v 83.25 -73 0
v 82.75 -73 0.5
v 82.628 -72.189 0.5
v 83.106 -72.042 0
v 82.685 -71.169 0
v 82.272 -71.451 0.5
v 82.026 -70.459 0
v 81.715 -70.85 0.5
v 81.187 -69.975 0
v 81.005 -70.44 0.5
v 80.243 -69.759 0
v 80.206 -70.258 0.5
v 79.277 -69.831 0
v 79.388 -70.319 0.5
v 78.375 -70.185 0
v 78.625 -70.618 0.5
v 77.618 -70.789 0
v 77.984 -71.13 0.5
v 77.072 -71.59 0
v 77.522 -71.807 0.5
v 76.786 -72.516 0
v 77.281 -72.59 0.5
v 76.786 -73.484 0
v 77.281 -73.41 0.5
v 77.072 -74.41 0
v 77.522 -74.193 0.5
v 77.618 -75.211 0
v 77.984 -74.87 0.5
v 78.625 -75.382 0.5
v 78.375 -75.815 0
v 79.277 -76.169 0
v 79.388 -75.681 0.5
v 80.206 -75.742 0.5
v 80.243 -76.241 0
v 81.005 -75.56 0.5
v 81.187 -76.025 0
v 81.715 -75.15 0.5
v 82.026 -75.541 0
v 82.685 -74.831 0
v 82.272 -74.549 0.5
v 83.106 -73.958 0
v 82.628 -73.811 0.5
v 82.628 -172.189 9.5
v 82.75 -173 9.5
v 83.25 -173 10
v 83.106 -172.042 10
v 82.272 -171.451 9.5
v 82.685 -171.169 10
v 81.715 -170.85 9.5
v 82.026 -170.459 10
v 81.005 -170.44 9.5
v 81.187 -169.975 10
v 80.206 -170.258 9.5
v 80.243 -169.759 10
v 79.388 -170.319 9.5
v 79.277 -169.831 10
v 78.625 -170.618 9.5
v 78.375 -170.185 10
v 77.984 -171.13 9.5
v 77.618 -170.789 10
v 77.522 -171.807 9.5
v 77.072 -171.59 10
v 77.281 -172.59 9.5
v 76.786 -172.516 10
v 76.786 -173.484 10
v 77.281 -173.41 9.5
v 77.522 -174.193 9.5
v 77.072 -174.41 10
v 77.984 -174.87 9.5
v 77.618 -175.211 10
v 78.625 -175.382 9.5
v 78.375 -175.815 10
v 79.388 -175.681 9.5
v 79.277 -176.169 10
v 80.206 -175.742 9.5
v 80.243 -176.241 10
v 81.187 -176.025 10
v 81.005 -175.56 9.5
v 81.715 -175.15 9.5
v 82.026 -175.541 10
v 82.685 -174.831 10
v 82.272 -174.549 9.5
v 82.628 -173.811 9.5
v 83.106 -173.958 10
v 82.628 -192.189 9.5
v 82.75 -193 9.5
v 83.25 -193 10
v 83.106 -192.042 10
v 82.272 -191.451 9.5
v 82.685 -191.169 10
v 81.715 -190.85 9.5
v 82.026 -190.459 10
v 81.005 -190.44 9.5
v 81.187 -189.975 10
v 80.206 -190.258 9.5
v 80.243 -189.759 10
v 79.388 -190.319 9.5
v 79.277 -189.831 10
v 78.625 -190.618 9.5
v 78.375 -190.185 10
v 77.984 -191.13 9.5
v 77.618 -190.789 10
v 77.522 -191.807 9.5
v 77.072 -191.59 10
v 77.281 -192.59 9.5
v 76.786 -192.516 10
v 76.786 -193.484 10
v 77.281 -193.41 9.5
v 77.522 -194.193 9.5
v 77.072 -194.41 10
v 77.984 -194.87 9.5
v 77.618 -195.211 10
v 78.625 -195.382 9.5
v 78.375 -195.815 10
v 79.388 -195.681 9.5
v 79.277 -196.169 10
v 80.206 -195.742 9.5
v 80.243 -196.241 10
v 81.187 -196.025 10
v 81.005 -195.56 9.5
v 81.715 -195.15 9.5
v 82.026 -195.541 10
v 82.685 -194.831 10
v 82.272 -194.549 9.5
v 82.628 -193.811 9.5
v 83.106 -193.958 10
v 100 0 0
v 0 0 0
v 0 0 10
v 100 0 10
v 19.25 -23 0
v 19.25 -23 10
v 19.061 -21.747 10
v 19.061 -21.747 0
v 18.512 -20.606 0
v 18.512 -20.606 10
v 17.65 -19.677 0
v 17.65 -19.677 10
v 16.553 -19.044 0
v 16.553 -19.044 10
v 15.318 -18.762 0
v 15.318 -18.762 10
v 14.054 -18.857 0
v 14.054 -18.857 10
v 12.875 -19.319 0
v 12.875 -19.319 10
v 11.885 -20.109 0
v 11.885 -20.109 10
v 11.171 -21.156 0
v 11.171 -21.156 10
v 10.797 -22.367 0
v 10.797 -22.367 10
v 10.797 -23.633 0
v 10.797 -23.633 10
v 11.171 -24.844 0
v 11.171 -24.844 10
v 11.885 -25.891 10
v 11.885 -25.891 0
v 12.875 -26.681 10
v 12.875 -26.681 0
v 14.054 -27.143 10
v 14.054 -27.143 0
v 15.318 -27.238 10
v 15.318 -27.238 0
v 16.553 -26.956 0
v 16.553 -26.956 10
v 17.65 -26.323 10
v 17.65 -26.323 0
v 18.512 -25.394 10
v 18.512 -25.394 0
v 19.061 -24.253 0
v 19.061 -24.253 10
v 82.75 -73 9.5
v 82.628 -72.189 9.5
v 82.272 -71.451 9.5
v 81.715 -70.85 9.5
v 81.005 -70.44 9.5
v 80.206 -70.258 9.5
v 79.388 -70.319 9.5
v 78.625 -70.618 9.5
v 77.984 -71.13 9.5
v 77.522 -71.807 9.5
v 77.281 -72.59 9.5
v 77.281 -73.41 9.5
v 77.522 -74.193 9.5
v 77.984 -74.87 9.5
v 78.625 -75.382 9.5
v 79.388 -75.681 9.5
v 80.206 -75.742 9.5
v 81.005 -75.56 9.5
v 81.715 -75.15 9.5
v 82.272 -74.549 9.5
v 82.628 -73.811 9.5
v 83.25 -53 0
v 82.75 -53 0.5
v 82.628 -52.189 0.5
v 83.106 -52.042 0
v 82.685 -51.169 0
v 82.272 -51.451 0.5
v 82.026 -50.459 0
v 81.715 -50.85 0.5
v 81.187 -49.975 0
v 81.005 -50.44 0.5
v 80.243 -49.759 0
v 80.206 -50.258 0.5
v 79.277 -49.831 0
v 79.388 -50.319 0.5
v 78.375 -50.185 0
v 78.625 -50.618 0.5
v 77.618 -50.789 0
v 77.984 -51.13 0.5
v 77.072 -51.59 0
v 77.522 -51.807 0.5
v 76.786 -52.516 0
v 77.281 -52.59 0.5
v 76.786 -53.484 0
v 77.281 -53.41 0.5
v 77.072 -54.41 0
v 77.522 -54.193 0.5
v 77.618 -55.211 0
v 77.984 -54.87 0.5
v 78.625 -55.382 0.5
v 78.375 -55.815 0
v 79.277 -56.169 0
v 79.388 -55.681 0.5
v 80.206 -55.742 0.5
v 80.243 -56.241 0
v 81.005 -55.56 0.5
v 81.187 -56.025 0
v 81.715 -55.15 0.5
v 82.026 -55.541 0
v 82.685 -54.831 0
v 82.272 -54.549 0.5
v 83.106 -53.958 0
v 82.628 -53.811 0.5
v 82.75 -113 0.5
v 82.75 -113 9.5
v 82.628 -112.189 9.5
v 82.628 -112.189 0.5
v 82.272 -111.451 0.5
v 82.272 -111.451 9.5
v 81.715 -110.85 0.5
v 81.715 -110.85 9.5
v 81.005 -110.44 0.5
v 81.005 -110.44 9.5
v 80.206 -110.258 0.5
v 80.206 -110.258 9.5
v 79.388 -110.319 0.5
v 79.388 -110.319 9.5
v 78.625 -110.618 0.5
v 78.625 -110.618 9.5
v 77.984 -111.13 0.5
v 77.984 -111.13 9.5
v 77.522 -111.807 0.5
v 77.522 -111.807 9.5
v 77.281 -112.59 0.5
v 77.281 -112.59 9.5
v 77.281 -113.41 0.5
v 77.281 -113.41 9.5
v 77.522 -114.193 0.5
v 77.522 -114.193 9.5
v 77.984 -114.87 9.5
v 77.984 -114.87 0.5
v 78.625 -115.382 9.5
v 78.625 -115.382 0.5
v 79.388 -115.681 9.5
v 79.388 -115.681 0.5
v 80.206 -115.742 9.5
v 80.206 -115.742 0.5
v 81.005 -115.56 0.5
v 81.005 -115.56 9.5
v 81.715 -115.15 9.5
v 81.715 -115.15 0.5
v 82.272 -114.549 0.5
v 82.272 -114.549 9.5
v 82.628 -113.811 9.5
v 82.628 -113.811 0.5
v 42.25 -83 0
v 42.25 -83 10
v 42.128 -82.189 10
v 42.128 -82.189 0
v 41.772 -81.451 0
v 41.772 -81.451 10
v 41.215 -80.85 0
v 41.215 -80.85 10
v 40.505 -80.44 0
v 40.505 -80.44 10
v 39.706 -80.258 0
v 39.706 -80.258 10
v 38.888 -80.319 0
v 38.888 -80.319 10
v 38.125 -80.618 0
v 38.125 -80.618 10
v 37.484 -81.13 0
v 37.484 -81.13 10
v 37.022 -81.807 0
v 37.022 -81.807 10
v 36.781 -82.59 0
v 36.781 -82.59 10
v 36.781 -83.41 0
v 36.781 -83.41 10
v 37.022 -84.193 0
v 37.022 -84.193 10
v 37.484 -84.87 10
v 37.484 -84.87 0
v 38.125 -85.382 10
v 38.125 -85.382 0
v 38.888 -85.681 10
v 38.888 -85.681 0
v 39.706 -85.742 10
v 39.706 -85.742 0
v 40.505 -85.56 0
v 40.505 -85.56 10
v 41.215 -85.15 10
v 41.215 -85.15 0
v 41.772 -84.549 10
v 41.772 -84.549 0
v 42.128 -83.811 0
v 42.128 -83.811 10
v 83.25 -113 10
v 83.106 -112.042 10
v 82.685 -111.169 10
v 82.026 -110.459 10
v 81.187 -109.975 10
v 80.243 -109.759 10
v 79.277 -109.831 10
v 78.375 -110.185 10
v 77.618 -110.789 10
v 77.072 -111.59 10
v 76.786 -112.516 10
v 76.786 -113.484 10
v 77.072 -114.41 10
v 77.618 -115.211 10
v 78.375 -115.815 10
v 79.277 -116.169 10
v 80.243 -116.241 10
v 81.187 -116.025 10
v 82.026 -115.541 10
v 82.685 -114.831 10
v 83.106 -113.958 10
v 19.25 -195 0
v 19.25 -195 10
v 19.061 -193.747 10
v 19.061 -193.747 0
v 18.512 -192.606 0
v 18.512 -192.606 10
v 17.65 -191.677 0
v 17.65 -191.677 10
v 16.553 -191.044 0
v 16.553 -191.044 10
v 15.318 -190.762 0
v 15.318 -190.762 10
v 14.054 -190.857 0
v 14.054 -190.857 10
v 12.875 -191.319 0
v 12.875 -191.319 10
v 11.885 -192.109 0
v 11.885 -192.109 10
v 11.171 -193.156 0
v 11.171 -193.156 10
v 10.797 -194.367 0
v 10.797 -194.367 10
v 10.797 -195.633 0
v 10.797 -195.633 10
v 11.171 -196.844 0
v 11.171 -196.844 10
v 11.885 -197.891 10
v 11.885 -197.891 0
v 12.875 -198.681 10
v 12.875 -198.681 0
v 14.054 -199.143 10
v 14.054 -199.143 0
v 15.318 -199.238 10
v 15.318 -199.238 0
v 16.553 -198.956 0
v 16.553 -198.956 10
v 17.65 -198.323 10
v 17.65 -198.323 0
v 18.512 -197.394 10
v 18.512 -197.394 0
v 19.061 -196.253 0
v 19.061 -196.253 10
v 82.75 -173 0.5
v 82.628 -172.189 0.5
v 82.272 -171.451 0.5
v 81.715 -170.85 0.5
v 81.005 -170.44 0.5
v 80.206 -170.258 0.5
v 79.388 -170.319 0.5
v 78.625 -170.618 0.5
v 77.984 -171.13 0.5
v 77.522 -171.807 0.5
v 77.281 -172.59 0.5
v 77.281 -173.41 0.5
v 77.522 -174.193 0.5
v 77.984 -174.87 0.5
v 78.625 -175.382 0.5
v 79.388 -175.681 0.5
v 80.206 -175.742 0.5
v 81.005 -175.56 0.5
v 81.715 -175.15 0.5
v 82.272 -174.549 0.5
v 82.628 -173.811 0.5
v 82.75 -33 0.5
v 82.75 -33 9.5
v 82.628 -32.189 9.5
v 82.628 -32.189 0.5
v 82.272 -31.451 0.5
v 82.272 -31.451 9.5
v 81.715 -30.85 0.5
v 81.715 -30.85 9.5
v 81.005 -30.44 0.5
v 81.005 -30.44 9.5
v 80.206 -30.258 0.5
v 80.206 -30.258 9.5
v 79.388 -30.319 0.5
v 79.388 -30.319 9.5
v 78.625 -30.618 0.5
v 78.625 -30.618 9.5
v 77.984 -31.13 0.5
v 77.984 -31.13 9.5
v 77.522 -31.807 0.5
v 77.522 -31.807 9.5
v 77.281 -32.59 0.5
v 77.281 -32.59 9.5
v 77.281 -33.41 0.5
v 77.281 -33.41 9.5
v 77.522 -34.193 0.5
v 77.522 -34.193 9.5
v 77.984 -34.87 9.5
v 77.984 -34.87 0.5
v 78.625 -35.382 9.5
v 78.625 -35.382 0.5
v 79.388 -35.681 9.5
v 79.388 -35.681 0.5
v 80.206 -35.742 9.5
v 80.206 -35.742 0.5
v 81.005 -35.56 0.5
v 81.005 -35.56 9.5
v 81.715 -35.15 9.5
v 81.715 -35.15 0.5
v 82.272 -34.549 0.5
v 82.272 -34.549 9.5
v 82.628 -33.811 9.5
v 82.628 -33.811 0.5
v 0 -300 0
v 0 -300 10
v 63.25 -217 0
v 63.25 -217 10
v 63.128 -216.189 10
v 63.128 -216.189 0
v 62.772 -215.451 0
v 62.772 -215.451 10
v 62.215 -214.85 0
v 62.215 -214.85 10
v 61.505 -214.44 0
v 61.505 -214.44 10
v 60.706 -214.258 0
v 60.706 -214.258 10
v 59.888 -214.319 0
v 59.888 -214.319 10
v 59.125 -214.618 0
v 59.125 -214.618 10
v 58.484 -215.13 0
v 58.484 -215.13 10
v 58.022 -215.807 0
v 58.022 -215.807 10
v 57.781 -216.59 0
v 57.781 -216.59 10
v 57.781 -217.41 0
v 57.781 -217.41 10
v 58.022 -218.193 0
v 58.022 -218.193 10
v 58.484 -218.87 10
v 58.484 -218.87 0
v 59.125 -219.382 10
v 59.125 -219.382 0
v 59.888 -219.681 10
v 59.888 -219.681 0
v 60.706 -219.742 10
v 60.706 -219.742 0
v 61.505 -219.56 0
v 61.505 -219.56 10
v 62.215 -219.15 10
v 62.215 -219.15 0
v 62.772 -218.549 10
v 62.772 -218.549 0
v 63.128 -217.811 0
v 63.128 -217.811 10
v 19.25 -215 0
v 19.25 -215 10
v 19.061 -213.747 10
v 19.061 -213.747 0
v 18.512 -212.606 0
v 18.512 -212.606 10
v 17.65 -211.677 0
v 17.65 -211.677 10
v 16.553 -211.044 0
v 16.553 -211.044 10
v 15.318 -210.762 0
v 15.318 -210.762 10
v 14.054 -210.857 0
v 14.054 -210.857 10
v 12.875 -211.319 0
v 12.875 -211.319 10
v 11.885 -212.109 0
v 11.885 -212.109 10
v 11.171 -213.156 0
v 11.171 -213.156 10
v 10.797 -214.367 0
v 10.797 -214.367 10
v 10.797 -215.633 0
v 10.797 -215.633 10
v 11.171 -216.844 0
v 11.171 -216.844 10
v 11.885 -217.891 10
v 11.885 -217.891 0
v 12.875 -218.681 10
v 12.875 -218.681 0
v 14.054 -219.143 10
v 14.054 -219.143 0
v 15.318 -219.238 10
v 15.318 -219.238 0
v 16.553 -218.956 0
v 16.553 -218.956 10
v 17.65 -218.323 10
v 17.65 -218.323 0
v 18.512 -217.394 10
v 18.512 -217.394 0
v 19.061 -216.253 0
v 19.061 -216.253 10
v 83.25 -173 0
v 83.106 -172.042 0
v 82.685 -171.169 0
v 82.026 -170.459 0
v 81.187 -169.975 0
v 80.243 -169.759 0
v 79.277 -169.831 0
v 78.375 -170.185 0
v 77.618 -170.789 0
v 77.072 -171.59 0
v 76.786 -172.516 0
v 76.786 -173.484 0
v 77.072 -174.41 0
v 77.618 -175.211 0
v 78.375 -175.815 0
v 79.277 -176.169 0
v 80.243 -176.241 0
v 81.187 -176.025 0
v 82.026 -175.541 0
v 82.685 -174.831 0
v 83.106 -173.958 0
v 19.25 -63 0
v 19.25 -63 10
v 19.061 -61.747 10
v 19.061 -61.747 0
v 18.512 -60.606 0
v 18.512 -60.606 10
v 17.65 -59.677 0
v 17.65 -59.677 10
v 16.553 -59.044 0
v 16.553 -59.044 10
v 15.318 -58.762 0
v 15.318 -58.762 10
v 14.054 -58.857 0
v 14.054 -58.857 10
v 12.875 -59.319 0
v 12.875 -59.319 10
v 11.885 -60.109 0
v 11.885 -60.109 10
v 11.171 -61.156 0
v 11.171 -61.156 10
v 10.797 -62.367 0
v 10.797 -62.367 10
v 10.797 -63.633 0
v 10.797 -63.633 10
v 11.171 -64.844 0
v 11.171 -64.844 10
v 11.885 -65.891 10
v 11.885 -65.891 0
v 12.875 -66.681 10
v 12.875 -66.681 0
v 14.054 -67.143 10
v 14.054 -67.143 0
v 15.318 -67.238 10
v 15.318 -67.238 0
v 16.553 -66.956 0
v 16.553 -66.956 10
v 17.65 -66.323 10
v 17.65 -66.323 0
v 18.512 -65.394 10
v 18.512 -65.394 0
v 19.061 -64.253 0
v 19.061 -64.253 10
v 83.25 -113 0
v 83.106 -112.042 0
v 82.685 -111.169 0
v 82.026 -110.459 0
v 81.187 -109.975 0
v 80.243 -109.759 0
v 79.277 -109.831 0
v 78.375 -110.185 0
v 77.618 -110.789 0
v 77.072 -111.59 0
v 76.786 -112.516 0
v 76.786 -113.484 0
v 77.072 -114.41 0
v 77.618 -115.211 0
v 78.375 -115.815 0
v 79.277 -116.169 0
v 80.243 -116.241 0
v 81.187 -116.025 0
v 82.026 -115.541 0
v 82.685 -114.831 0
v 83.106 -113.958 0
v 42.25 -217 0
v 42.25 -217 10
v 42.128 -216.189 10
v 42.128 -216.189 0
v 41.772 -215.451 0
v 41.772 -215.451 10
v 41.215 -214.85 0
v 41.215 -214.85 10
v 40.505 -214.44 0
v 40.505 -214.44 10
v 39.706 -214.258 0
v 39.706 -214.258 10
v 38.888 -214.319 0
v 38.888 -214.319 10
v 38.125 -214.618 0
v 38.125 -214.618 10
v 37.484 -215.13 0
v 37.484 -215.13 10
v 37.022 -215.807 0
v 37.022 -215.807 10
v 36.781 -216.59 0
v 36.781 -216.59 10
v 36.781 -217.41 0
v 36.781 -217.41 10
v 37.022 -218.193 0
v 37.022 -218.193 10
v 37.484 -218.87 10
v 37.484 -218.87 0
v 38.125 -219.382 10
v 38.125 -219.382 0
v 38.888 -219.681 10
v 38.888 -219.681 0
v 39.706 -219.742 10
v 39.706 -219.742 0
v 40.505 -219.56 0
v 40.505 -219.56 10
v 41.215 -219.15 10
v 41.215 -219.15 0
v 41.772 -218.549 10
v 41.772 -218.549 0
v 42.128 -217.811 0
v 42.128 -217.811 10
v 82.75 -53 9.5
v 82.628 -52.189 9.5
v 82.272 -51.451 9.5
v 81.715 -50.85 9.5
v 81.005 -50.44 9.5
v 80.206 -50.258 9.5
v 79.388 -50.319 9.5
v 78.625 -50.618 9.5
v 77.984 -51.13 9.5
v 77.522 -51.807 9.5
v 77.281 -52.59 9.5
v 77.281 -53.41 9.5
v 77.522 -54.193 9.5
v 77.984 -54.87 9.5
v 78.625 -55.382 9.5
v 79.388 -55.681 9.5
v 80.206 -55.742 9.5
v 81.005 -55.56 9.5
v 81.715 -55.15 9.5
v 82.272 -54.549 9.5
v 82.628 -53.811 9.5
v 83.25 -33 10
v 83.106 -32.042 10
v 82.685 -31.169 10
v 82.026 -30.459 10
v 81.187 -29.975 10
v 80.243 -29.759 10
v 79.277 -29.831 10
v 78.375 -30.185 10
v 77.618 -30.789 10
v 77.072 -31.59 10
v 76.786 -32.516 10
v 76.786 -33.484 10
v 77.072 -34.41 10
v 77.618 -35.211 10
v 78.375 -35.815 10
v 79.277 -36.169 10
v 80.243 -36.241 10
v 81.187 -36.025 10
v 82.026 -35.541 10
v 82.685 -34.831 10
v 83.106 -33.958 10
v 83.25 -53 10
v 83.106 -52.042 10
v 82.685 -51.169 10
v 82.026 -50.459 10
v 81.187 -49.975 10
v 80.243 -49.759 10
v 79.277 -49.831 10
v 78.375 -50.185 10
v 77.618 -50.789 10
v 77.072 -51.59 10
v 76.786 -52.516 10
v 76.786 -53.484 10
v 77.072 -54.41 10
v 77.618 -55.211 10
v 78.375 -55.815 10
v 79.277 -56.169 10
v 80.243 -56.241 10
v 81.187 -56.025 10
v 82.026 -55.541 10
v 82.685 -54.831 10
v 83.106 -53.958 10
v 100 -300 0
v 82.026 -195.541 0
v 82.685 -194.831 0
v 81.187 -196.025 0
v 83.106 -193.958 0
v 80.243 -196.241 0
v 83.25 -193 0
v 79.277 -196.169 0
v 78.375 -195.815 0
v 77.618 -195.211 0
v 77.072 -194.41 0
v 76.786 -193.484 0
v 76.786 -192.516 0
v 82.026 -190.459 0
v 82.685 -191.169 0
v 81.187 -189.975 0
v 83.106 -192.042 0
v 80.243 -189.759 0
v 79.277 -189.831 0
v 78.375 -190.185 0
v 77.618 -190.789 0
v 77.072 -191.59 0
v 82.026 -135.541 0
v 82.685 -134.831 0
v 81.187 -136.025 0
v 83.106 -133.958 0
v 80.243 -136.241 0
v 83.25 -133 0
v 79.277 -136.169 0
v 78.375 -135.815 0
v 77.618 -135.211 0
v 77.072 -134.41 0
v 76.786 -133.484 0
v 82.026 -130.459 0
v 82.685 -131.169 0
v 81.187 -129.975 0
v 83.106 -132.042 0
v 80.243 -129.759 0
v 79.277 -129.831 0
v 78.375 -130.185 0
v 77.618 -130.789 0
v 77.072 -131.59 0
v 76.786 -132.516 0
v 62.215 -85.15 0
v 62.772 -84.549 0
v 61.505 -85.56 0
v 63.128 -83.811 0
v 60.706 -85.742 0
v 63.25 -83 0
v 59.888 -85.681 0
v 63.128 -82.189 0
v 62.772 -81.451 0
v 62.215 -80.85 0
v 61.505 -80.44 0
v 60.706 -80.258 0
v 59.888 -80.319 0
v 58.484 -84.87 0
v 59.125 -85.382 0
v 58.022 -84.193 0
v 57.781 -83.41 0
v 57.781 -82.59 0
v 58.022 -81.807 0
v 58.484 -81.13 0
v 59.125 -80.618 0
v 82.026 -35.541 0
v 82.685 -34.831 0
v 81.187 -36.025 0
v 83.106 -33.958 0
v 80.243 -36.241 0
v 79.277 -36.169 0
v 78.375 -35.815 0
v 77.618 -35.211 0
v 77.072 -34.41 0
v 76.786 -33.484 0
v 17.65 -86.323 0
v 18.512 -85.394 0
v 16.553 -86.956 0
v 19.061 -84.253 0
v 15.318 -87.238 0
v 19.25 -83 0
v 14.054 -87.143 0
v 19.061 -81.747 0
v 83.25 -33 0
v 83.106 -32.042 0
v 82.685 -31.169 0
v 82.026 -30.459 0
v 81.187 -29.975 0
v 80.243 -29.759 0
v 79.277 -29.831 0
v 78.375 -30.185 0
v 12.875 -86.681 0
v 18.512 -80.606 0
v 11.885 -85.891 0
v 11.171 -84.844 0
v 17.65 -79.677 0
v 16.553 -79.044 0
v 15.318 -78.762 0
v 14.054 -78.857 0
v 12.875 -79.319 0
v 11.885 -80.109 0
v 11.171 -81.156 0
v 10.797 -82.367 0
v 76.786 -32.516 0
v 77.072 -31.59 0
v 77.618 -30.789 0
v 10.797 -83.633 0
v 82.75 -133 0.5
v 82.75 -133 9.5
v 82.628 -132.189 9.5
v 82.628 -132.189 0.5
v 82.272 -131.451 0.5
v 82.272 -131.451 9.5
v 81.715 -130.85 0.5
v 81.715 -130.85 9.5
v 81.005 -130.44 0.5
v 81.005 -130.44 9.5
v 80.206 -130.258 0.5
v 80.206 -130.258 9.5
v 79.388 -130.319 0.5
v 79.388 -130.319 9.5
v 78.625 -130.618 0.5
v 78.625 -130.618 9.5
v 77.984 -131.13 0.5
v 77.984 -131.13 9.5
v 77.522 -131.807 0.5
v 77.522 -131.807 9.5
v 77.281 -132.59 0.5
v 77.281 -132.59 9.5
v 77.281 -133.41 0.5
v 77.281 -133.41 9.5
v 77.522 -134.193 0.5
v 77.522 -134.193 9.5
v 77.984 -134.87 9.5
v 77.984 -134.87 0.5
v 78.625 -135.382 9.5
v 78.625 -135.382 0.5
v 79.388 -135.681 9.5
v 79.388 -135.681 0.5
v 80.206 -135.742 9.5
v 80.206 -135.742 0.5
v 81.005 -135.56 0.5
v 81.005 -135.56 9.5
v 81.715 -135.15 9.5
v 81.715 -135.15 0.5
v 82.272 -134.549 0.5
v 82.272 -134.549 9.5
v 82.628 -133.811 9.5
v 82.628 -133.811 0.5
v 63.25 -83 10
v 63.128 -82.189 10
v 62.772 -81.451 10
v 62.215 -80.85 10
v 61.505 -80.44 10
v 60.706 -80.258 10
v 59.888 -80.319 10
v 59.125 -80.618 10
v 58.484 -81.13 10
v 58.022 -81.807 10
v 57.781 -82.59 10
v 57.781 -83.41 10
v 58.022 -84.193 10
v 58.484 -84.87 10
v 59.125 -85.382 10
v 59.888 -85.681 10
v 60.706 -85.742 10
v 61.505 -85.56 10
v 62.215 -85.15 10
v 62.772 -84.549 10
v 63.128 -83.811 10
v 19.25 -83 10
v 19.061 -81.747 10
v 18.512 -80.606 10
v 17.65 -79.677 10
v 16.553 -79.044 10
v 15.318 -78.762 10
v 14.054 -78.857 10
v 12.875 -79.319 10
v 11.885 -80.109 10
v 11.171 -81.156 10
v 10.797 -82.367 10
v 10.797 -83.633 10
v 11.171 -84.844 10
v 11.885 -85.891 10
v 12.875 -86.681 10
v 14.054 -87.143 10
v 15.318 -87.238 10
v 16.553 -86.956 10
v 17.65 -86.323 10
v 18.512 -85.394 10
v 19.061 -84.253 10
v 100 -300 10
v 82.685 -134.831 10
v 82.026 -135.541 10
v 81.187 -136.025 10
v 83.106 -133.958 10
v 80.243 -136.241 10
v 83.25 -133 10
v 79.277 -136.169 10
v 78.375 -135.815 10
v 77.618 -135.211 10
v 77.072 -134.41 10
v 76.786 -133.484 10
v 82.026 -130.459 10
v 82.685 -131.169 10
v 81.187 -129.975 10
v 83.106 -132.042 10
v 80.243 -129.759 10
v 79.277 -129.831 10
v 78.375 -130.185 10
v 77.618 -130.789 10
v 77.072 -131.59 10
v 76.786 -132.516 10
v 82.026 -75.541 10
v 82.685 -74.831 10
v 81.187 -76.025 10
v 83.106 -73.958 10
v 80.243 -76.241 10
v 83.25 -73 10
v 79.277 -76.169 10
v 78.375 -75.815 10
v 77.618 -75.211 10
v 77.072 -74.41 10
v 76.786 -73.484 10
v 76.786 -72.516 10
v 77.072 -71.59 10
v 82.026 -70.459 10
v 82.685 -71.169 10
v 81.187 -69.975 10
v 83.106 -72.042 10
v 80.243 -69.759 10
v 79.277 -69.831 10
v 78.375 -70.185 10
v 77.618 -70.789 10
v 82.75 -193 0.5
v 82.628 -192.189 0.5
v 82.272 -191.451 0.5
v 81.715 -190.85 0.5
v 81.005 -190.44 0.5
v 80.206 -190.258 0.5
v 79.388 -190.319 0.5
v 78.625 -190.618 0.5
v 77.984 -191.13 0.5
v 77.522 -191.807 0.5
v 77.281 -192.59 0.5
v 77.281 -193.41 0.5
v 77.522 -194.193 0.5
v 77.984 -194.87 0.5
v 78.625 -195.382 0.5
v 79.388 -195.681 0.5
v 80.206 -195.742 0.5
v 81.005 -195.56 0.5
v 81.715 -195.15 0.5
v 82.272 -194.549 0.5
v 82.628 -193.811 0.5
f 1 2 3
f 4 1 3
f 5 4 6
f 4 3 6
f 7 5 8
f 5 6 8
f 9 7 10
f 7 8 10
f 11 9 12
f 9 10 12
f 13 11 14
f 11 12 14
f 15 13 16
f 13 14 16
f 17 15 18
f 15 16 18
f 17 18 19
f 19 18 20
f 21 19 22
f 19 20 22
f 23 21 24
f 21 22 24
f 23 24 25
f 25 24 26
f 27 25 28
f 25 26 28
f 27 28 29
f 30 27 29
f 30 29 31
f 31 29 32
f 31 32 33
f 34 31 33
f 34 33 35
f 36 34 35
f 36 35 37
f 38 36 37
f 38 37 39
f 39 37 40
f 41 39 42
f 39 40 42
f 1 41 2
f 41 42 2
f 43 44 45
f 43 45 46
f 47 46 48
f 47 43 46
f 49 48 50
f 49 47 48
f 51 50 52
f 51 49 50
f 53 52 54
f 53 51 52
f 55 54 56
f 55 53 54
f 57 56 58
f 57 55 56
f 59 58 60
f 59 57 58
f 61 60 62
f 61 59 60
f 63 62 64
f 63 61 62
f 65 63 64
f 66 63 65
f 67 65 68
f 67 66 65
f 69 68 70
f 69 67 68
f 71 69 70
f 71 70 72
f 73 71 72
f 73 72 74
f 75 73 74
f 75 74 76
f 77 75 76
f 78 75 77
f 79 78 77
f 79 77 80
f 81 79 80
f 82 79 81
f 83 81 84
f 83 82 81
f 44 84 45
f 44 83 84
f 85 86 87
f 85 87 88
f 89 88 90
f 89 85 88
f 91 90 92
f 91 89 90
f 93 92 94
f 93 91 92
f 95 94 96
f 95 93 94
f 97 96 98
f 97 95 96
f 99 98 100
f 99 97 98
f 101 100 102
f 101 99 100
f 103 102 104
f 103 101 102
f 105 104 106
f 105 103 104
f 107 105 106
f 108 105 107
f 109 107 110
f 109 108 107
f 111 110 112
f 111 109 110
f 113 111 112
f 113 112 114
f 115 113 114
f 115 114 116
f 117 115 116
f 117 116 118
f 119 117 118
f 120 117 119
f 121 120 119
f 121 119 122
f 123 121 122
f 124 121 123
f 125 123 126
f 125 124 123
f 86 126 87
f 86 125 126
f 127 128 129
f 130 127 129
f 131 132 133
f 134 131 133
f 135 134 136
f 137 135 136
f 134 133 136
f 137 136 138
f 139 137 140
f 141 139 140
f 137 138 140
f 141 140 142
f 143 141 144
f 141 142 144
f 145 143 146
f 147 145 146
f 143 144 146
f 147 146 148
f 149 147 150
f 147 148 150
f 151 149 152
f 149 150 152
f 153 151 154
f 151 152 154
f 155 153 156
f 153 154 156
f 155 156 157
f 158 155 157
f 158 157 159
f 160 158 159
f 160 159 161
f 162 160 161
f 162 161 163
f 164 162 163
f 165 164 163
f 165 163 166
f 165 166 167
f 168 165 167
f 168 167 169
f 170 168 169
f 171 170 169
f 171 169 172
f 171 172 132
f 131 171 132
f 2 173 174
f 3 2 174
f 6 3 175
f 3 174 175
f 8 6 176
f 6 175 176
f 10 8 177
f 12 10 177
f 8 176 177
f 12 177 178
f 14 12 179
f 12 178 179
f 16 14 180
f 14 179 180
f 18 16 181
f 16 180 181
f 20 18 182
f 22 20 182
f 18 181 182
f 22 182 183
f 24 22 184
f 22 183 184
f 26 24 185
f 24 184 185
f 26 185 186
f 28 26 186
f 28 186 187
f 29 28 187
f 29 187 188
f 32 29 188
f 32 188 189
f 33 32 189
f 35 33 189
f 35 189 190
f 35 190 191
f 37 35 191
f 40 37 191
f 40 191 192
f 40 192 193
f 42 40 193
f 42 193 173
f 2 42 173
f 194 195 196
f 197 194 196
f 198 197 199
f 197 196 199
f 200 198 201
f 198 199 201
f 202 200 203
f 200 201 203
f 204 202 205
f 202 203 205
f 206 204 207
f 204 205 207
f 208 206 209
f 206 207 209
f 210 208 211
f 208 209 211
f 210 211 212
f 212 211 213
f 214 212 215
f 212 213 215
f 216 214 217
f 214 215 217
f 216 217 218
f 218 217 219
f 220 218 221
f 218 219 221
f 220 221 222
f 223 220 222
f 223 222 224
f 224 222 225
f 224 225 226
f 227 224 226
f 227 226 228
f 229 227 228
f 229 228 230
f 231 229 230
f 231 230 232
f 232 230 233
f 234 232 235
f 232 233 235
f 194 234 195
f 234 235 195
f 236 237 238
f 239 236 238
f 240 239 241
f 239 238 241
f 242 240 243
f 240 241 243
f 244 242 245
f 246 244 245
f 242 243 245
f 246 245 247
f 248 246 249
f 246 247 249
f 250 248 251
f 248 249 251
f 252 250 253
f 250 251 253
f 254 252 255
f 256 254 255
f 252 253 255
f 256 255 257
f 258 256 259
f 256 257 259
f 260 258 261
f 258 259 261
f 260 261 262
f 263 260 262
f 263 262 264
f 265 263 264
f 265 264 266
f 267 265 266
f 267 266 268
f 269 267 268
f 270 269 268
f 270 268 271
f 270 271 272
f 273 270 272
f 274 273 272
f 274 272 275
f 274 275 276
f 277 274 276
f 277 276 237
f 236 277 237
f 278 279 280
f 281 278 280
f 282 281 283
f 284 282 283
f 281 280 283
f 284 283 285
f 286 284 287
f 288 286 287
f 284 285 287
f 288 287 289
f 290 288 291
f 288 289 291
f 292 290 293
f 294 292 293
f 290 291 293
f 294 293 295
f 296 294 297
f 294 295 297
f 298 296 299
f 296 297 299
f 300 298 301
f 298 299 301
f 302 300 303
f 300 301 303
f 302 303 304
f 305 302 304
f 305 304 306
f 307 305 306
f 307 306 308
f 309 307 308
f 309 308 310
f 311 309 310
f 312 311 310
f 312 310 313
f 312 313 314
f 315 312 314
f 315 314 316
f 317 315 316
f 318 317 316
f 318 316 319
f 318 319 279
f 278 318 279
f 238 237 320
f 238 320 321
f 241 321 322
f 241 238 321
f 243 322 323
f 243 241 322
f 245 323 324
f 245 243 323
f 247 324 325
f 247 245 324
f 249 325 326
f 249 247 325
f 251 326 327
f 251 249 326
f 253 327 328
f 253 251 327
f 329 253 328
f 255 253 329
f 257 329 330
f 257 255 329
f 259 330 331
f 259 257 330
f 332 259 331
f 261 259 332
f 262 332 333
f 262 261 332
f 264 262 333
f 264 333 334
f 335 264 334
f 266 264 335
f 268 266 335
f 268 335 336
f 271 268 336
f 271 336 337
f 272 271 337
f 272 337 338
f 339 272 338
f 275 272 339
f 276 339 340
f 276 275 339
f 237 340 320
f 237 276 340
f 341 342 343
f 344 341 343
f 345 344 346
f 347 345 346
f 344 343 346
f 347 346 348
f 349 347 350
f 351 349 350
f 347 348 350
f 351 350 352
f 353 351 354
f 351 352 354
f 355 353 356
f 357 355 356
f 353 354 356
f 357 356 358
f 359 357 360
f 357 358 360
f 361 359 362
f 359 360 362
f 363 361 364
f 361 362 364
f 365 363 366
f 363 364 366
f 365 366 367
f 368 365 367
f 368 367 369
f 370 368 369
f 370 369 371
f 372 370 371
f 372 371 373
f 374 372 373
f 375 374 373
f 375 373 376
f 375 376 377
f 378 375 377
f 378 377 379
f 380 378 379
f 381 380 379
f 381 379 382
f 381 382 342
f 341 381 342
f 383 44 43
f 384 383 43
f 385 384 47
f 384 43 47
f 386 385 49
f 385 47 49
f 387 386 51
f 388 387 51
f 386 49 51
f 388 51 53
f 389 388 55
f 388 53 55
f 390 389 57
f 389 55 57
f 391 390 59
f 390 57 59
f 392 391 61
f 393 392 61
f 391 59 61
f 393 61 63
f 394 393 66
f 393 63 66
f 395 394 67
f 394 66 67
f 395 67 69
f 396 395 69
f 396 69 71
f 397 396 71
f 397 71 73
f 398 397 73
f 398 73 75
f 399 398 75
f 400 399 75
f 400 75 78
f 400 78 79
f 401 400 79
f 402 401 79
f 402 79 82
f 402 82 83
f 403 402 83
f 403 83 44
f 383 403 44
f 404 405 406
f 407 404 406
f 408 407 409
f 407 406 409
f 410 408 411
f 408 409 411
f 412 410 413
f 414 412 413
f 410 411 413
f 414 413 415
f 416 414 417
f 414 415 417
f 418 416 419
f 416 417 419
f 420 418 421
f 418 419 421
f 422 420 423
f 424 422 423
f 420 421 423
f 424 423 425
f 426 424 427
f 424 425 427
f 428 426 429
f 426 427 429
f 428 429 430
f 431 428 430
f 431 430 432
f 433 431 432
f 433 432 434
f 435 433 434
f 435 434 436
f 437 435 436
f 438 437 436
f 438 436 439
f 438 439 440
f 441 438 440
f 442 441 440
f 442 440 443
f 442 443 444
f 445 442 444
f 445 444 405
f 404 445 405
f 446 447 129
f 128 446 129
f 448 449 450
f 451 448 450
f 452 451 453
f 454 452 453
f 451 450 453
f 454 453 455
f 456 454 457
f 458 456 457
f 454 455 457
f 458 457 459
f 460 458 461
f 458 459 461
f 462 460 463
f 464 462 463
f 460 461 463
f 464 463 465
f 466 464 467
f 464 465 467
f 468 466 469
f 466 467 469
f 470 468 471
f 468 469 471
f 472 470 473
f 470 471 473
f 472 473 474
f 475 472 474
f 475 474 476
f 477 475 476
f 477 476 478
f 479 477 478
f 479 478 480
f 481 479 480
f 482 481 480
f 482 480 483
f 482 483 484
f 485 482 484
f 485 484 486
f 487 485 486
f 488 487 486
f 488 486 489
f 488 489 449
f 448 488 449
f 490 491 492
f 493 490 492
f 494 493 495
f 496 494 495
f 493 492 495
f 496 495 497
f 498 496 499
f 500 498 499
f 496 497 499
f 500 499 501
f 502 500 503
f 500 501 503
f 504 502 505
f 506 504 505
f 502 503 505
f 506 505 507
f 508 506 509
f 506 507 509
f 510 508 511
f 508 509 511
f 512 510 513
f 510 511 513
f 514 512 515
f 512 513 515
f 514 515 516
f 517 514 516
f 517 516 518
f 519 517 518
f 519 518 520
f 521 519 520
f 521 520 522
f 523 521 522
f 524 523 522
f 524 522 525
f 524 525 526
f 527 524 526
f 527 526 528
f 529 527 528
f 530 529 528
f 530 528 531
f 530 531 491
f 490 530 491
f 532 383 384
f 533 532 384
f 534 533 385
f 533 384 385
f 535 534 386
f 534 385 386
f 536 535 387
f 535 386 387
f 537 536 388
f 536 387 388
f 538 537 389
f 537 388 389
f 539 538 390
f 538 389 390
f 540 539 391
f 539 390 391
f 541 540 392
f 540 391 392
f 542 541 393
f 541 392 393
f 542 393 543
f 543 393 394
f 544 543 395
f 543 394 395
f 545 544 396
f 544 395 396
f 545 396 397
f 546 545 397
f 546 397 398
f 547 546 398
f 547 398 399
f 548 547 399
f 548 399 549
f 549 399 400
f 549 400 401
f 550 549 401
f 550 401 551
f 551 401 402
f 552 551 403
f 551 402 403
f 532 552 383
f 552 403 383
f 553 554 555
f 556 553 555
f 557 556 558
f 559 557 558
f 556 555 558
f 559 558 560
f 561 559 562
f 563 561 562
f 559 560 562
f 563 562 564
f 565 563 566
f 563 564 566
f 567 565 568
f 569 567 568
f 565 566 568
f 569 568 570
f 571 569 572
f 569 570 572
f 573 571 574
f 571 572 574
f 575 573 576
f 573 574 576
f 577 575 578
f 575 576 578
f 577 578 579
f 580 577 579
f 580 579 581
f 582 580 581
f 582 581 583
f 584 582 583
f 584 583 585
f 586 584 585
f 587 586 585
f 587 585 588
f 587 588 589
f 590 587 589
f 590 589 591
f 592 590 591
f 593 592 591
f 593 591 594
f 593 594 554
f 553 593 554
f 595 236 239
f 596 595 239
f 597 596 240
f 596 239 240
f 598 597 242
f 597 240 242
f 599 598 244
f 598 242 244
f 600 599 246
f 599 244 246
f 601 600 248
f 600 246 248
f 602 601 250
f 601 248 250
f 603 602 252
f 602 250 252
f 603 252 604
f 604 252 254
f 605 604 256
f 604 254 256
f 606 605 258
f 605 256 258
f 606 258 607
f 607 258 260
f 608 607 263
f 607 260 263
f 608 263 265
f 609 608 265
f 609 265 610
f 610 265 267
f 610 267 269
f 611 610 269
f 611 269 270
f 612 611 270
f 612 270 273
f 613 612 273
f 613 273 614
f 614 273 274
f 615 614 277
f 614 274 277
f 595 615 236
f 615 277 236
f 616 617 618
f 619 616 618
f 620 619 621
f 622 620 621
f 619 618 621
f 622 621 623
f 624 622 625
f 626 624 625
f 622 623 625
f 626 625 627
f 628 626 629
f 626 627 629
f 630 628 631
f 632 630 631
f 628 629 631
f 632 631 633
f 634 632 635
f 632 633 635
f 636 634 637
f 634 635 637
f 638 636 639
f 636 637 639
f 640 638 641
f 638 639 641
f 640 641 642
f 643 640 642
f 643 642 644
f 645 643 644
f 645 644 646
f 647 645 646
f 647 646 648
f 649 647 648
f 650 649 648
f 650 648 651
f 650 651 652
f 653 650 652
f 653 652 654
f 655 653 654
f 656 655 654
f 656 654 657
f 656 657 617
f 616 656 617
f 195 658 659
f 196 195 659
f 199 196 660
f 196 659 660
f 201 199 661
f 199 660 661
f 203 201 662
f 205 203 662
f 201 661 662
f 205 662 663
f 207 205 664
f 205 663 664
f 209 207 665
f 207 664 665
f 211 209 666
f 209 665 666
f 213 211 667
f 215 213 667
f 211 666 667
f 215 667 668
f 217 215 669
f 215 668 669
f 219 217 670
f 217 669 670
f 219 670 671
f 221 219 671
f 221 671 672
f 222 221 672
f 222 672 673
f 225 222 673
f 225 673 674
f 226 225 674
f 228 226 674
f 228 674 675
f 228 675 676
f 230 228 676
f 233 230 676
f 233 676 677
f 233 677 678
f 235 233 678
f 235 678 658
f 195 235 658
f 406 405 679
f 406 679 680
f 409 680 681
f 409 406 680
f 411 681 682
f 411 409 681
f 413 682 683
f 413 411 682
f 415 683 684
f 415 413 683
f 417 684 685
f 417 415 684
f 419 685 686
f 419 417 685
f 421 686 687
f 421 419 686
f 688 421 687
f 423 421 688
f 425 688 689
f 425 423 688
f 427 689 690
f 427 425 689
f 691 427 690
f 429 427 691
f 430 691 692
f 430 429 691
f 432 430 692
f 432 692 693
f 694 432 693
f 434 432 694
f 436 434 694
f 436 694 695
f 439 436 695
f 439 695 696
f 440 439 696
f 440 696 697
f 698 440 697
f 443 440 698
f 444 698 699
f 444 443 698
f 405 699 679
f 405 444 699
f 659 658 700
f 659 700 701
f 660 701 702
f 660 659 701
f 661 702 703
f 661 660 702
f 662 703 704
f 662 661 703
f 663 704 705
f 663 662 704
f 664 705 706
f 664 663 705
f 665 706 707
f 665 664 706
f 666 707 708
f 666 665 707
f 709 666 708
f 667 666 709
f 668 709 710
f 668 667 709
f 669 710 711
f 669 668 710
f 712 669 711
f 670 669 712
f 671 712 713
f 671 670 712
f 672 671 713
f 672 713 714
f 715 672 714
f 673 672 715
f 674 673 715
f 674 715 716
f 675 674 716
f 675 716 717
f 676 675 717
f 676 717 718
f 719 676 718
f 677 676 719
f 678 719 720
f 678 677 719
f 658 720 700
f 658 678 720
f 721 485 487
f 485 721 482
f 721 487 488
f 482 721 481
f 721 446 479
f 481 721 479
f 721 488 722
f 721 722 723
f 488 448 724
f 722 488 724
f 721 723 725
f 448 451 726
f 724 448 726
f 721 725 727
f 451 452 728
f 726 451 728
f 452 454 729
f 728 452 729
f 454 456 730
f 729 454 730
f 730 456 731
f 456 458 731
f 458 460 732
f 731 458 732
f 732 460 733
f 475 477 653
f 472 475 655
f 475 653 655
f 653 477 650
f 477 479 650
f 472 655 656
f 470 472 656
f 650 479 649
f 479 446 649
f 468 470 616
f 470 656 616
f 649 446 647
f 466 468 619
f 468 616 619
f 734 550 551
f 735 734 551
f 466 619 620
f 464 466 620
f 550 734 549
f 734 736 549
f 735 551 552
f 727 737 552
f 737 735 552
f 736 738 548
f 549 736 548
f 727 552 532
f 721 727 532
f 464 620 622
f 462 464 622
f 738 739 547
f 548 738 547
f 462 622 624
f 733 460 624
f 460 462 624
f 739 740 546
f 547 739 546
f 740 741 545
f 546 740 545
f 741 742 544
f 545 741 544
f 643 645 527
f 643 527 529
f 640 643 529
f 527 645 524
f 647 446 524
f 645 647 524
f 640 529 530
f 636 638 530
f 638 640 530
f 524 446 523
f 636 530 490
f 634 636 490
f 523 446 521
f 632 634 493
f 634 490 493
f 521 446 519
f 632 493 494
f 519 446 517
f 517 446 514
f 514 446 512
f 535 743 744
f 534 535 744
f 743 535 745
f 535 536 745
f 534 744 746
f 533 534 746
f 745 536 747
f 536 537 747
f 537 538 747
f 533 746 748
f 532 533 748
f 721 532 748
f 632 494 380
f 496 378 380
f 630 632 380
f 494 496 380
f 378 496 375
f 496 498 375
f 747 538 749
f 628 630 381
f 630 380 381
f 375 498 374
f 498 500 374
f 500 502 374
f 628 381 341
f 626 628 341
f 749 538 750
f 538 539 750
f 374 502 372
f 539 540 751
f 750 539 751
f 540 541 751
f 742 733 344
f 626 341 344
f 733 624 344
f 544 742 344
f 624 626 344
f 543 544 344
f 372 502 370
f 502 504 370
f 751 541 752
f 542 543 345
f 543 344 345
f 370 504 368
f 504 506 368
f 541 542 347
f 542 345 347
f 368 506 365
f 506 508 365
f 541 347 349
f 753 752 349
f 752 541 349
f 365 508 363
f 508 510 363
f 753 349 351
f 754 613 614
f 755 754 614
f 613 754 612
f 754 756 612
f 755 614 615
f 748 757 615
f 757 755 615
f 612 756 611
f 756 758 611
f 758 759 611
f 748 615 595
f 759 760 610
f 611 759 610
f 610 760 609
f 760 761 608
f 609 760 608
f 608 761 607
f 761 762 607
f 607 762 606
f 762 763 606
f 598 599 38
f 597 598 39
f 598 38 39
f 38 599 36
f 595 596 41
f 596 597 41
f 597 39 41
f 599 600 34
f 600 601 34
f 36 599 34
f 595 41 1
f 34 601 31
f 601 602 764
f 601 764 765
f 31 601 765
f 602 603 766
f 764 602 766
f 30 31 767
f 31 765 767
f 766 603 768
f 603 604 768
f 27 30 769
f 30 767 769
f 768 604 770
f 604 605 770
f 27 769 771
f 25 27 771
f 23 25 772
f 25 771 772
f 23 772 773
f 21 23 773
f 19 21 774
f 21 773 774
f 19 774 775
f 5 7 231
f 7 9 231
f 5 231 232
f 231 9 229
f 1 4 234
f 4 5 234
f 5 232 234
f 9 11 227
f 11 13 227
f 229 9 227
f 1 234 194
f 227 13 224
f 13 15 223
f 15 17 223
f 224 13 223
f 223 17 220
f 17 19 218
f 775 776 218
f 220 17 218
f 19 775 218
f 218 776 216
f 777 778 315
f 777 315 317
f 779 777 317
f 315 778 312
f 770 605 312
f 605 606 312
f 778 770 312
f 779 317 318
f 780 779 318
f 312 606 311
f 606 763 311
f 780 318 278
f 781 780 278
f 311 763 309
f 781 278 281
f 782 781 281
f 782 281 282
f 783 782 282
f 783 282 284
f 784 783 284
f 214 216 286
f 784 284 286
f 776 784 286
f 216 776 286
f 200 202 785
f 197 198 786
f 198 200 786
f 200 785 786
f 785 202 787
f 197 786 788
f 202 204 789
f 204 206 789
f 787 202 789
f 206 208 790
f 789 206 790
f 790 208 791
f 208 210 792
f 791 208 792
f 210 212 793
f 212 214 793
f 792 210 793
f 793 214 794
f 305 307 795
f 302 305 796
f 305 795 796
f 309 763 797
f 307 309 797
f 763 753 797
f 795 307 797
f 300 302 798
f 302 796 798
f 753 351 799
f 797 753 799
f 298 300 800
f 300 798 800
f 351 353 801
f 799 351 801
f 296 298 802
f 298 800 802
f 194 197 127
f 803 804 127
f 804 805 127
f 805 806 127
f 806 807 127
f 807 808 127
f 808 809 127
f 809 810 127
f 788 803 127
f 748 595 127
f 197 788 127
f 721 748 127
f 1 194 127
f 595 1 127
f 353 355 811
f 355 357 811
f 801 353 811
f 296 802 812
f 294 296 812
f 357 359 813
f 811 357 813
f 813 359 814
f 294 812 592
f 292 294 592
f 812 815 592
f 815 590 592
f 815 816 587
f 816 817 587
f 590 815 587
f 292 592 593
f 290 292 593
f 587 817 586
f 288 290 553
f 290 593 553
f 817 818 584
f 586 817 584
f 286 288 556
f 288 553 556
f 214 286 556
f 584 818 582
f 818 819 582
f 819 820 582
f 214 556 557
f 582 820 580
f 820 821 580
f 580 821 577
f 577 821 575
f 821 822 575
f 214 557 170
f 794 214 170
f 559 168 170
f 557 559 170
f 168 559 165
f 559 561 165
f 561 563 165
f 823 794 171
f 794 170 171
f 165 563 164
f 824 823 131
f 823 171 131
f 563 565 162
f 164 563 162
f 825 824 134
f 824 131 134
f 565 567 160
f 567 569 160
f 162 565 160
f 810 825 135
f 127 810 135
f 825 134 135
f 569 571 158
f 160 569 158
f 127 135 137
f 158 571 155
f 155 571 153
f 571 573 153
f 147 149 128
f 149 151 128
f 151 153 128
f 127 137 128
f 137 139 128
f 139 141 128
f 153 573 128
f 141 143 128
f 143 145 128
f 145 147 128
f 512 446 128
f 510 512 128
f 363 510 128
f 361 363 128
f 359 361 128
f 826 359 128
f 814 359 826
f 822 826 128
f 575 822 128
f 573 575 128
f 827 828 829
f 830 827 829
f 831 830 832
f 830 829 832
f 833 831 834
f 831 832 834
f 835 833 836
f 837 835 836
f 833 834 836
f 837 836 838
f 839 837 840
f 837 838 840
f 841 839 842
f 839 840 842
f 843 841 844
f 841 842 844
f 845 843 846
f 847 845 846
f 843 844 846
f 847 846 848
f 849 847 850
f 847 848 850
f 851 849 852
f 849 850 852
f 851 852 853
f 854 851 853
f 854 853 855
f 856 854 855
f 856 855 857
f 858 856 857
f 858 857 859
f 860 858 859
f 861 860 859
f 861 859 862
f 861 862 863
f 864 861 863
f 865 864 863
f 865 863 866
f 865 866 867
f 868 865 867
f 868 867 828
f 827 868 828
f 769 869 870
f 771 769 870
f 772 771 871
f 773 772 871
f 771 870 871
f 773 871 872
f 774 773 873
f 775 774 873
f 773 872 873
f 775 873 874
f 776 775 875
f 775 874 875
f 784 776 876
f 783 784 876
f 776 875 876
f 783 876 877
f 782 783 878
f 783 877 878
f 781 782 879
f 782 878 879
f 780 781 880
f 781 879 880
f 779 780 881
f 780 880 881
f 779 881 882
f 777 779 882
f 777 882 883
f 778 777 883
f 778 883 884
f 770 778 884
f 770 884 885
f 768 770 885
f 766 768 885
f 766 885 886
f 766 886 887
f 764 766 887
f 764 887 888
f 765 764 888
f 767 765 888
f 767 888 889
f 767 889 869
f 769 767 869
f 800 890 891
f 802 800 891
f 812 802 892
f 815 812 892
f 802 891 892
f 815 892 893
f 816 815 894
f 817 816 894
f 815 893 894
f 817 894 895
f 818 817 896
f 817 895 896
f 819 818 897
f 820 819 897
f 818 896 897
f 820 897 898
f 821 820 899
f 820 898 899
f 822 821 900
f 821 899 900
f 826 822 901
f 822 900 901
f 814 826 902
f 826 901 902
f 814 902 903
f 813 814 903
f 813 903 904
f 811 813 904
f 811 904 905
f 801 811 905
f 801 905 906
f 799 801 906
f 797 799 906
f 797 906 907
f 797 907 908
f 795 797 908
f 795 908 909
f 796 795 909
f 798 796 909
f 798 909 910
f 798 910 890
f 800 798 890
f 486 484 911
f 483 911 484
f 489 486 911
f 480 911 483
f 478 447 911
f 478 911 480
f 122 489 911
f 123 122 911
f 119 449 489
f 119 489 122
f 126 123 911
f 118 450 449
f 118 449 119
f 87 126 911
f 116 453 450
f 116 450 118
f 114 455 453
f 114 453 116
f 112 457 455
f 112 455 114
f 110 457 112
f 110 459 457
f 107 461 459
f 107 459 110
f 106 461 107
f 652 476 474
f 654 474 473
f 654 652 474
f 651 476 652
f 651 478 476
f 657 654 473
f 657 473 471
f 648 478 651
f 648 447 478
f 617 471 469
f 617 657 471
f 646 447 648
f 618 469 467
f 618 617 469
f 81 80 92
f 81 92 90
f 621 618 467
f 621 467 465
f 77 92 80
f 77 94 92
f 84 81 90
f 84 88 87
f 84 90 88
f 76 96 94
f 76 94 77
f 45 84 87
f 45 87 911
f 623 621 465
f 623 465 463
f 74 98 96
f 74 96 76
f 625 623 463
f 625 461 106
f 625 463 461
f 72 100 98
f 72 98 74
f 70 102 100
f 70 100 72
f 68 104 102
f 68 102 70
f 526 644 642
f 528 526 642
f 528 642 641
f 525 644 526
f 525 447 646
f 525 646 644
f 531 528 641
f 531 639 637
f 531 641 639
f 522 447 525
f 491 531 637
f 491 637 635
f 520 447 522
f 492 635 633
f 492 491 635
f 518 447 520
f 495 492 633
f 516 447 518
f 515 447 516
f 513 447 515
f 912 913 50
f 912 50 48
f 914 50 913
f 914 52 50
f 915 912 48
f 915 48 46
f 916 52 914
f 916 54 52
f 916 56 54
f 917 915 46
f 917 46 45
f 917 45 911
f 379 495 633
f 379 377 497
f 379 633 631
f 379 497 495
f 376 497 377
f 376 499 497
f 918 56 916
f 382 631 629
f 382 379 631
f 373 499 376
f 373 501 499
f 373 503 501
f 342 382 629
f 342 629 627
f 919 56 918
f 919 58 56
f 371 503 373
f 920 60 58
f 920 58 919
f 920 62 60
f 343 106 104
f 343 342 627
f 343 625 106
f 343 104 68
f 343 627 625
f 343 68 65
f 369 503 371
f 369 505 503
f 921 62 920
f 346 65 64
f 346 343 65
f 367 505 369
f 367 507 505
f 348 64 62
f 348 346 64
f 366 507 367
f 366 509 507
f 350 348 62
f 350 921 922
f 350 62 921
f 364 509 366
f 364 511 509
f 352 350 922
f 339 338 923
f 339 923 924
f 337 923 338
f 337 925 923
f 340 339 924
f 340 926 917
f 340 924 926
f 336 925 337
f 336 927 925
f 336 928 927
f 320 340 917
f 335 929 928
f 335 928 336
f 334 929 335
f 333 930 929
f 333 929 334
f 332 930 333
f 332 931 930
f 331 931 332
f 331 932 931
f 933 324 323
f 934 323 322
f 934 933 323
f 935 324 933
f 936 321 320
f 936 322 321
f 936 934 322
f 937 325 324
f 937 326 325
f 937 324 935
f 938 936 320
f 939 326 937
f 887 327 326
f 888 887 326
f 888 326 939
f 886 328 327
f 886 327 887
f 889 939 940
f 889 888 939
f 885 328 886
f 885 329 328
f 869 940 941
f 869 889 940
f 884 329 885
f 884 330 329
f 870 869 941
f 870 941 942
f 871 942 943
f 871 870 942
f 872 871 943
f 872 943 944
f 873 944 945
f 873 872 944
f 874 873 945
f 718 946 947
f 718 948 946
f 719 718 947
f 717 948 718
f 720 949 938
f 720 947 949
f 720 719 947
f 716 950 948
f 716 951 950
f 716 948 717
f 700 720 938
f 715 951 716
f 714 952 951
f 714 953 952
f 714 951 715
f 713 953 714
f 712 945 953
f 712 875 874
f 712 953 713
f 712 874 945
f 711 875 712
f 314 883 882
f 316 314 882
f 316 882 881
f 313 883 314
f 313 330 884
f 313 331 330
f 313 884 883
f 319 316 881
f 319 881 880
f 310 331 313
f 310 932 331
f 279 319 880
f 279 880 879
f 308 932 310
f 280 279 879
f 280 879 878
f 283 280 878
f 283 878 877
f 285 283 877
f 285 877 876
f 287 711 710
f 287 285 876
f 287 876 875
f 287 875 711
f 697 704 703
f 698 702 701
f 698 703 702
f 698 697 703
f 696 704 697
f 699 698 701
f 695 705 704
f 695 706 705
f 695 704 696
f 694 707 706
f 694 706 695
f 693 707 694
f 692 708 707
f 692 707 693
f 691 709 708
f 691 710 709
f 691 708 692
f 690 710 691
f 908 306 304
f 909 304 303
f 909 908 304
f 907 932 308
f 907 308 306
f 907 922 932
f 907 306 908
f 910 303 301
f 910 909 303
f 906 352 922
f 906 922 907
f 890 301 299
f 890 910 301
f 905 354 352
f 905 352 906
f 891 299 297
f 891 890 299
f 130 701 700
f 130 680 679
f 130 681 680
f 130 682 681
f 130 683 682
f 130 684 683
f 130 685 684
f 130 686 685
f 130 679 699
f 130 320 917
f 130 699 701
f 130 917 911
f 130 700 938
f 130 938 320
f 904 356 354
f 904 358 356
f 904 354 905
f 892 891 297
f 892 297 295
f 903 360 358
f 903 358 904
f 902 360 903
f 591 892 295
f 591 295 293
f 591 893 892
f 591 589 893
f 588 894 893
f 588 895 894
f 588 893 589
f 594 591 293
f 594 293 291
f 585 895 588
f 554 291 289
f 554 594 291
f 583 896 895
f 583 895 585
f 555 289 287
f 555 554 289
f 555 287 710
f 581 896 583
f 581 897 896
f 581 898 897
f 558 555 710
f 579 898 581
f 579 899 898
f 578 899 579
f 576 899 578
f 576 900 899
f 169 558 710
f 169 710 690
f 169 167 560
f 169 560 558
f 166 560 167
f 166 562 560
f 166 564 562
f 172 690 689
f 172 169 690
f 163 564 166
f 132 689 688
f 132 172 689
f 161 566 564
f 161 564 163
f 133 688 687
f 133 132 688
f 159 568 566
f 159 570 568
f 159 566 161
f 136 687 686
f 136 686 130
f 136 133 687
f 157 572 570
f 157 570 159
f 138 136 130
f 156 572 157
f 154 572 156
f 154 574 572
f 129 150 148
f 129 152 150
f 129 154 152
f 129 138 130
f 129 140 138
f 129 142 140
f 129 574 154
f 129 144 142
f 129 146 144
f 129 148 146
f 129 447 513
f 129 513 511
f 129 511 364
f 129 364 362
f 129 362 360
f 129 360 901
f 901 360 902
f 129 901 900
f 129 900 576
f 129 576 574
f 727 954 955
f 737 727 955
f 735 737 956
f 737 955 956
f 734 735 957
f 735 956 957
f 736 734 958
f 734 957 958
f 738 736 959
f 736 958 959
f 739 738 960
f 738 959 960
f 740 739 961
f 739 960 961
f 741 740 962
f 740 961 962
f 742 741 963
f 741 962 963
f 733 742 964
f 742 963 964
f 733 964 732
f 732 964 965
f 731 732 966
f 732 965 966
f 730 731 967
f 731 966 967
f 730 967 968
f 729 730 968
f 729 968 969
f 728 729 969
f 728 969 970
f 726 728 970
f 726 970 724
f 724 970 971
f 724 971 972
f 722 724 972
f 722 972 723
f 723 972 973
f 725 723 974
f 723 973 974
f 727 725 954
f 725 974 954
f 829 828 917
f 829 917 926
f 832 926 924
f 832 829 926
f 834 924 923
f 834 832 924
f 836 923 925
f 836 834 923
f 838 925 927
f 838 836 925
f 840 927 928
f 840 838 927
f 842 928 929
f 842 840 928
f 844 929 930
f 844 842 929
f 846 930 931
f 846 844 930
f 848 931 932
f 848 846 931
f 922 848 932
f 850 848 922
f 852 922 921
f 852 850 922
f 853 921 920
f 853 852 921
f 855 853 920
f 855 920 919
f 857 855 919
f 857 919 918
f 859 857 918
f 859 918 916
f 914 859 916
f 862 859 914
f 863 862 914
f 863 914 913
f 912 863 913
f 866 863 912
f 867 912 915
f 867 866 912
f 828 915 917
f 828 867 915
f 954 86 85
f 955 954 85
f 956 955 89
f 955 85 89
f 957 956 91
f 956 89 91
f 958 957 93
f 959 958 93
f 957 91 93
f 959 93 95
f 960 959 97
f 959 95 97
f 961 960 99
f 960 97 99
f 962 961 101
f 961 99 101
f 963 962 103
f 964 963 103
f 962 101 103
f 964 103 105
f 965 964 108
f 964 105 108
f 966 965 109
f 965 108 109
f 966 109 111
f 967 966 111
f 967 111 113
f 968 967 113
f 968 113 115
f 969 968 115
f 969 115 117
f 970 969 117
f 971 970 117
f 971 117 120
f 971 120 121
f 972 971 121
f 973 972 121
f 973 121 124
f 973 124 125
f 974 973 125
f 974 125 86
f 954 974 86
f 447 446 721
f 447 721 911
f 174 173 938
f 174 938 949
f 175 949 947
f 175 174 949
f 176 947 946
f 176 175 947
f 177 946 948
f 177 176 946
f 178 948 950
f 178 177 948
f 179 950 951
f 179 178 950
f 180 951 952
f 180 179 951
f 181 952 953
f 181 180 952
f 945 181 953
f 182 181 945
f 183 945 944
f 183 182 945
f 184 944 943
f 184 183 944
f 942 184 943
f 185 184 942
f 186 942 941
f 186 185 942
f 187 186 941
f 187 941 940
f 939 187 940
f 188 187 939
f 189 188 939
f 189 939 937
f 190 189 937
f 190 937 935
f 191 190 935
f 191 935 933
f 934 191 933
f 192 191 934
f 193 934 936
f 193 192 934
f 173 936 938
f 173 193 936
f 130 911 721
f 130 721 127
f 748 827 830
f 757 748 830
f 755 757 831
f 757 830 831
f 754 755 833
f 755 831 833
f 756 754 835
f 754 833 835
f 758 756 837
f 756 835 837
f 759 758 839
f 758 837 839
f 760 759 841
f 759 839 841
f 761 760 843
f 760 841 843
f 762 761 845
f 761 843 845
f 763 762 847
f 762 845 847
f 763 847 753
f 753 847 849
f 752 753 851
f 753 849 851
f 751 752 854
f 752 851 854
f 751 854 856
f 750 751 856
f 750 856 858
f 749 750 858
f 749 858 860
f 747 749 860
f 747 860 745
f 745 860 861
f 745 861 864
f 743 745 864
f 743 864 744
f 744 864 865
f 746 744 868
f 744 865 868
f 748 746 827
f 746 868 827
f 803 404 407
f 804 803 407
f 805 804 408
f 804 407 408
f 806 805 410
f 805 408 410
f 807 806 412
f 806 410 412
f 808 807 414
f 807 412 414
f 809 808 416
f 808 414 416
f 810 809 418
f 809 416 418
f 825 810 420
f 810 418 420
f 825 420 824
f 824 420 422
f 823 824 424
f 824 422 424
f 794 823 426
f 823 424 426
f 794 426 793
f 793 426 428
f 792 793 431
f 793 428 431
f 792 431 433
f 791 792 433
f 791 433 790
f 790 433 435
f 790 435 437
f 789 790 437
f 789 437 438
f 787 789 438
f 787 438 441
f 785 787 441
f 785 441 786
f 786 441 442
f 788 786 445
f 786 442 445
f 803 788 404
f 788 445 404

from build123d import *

# Parameters (mm, degrees)
F0_W     = 300
F0_H     = 10
F1_DEPTH = 100
F2_R     = 2.75
F2_R_2   = 4.25
F3_DEPTH = 10.001
F4_R     = 2.75
F5_DEPTH = 10.001
F6_SIZE  = 0.5


with BuildPart() as f1:
    # F0 (on Right) → F1 (new body)
    with BuildSketch(Plane.YZ):
        with Locations((-150, 5)):
            Rectangle(F0_W, F0_H)
    extrude(amount=F1_DEPTH)

    # F2 (on face) → F3 (cut, through all)
    with BuildSketch(Plane.XY.offset(10)):
        with Locations((60.5, -83)):
            Circle(F2_R)
        with Locations((39.5, -83)):
            Circle(F2_R)
        with Locations((39.5, -217)):
            Circle(F2_R)
        with Locations((60.5, -217)):
            Circle(F2_R)
        with Locations((15, -215)):
            Circle(F2_R_2)
        with Locations((15, -195)):
            Circle(F2_R_2)
        with Locations((15, -83)):
            Circle(F2_R_2)
        with Locations((15, -63)):
            Circle(F2_R_2)
        with Locations((15, -23)):
            Circle(F2_R_2)
    extrude(amount=-F3_DEPTH, mode=Mode.SUBTRACT)

    # F4 (on face) → F5 (cut, through all)
    with BuildSketch(Plane.XY.offset(10)):
        with Locations((80, -193)):
            Circle(F4_R)
        with Locations((80, -173)):
            Circle(F4_R)
        with Locations((80, -133)):
            Circle(F4_R)
        with Locations((80, -113)):
            Circle(F4_R)
        with Locations((80, -73)):
            Circle(F4_R)
        with Locations((80, -53)):
            Circle(F4_R)
        with Locations((80, -33)):
            Circle(F4_R)
    extrude(amount=-F5_DEPTH, mode=Mode.SUBTRACT)

    # F6
    f6_edges = [f1.edges().sort_by_distance(p)[0] for p in [
        (77.25, -53, 10),
        (82.75, -53, 5),
        (77.25, -53, 0),
        (77.25, -73, 10),
        (82.75, -73, 5),
        (77.25, -73, 0),
        (77.25, -113, 10),
        (82.75, -113, 5),
        (77.25, -113, 0),
        (77.25, -133, 10),
        (82.75, -133, 5),
        (77.25, -133, 0),
        (77.25, -173, 10),
        (82.75, -173, 5),
        (77.25, -173, 0),
        (77.25, -193, 10),
        (82.75, -193, 5),
        (77.25, -193, 0),
        (77.25, -33, 10),
        (82.75, -33, 5),
        (77.25, -33, 0),
    ]]
    chamfer(f6_edges, length=F6_SIZE)


solid = f1.part
